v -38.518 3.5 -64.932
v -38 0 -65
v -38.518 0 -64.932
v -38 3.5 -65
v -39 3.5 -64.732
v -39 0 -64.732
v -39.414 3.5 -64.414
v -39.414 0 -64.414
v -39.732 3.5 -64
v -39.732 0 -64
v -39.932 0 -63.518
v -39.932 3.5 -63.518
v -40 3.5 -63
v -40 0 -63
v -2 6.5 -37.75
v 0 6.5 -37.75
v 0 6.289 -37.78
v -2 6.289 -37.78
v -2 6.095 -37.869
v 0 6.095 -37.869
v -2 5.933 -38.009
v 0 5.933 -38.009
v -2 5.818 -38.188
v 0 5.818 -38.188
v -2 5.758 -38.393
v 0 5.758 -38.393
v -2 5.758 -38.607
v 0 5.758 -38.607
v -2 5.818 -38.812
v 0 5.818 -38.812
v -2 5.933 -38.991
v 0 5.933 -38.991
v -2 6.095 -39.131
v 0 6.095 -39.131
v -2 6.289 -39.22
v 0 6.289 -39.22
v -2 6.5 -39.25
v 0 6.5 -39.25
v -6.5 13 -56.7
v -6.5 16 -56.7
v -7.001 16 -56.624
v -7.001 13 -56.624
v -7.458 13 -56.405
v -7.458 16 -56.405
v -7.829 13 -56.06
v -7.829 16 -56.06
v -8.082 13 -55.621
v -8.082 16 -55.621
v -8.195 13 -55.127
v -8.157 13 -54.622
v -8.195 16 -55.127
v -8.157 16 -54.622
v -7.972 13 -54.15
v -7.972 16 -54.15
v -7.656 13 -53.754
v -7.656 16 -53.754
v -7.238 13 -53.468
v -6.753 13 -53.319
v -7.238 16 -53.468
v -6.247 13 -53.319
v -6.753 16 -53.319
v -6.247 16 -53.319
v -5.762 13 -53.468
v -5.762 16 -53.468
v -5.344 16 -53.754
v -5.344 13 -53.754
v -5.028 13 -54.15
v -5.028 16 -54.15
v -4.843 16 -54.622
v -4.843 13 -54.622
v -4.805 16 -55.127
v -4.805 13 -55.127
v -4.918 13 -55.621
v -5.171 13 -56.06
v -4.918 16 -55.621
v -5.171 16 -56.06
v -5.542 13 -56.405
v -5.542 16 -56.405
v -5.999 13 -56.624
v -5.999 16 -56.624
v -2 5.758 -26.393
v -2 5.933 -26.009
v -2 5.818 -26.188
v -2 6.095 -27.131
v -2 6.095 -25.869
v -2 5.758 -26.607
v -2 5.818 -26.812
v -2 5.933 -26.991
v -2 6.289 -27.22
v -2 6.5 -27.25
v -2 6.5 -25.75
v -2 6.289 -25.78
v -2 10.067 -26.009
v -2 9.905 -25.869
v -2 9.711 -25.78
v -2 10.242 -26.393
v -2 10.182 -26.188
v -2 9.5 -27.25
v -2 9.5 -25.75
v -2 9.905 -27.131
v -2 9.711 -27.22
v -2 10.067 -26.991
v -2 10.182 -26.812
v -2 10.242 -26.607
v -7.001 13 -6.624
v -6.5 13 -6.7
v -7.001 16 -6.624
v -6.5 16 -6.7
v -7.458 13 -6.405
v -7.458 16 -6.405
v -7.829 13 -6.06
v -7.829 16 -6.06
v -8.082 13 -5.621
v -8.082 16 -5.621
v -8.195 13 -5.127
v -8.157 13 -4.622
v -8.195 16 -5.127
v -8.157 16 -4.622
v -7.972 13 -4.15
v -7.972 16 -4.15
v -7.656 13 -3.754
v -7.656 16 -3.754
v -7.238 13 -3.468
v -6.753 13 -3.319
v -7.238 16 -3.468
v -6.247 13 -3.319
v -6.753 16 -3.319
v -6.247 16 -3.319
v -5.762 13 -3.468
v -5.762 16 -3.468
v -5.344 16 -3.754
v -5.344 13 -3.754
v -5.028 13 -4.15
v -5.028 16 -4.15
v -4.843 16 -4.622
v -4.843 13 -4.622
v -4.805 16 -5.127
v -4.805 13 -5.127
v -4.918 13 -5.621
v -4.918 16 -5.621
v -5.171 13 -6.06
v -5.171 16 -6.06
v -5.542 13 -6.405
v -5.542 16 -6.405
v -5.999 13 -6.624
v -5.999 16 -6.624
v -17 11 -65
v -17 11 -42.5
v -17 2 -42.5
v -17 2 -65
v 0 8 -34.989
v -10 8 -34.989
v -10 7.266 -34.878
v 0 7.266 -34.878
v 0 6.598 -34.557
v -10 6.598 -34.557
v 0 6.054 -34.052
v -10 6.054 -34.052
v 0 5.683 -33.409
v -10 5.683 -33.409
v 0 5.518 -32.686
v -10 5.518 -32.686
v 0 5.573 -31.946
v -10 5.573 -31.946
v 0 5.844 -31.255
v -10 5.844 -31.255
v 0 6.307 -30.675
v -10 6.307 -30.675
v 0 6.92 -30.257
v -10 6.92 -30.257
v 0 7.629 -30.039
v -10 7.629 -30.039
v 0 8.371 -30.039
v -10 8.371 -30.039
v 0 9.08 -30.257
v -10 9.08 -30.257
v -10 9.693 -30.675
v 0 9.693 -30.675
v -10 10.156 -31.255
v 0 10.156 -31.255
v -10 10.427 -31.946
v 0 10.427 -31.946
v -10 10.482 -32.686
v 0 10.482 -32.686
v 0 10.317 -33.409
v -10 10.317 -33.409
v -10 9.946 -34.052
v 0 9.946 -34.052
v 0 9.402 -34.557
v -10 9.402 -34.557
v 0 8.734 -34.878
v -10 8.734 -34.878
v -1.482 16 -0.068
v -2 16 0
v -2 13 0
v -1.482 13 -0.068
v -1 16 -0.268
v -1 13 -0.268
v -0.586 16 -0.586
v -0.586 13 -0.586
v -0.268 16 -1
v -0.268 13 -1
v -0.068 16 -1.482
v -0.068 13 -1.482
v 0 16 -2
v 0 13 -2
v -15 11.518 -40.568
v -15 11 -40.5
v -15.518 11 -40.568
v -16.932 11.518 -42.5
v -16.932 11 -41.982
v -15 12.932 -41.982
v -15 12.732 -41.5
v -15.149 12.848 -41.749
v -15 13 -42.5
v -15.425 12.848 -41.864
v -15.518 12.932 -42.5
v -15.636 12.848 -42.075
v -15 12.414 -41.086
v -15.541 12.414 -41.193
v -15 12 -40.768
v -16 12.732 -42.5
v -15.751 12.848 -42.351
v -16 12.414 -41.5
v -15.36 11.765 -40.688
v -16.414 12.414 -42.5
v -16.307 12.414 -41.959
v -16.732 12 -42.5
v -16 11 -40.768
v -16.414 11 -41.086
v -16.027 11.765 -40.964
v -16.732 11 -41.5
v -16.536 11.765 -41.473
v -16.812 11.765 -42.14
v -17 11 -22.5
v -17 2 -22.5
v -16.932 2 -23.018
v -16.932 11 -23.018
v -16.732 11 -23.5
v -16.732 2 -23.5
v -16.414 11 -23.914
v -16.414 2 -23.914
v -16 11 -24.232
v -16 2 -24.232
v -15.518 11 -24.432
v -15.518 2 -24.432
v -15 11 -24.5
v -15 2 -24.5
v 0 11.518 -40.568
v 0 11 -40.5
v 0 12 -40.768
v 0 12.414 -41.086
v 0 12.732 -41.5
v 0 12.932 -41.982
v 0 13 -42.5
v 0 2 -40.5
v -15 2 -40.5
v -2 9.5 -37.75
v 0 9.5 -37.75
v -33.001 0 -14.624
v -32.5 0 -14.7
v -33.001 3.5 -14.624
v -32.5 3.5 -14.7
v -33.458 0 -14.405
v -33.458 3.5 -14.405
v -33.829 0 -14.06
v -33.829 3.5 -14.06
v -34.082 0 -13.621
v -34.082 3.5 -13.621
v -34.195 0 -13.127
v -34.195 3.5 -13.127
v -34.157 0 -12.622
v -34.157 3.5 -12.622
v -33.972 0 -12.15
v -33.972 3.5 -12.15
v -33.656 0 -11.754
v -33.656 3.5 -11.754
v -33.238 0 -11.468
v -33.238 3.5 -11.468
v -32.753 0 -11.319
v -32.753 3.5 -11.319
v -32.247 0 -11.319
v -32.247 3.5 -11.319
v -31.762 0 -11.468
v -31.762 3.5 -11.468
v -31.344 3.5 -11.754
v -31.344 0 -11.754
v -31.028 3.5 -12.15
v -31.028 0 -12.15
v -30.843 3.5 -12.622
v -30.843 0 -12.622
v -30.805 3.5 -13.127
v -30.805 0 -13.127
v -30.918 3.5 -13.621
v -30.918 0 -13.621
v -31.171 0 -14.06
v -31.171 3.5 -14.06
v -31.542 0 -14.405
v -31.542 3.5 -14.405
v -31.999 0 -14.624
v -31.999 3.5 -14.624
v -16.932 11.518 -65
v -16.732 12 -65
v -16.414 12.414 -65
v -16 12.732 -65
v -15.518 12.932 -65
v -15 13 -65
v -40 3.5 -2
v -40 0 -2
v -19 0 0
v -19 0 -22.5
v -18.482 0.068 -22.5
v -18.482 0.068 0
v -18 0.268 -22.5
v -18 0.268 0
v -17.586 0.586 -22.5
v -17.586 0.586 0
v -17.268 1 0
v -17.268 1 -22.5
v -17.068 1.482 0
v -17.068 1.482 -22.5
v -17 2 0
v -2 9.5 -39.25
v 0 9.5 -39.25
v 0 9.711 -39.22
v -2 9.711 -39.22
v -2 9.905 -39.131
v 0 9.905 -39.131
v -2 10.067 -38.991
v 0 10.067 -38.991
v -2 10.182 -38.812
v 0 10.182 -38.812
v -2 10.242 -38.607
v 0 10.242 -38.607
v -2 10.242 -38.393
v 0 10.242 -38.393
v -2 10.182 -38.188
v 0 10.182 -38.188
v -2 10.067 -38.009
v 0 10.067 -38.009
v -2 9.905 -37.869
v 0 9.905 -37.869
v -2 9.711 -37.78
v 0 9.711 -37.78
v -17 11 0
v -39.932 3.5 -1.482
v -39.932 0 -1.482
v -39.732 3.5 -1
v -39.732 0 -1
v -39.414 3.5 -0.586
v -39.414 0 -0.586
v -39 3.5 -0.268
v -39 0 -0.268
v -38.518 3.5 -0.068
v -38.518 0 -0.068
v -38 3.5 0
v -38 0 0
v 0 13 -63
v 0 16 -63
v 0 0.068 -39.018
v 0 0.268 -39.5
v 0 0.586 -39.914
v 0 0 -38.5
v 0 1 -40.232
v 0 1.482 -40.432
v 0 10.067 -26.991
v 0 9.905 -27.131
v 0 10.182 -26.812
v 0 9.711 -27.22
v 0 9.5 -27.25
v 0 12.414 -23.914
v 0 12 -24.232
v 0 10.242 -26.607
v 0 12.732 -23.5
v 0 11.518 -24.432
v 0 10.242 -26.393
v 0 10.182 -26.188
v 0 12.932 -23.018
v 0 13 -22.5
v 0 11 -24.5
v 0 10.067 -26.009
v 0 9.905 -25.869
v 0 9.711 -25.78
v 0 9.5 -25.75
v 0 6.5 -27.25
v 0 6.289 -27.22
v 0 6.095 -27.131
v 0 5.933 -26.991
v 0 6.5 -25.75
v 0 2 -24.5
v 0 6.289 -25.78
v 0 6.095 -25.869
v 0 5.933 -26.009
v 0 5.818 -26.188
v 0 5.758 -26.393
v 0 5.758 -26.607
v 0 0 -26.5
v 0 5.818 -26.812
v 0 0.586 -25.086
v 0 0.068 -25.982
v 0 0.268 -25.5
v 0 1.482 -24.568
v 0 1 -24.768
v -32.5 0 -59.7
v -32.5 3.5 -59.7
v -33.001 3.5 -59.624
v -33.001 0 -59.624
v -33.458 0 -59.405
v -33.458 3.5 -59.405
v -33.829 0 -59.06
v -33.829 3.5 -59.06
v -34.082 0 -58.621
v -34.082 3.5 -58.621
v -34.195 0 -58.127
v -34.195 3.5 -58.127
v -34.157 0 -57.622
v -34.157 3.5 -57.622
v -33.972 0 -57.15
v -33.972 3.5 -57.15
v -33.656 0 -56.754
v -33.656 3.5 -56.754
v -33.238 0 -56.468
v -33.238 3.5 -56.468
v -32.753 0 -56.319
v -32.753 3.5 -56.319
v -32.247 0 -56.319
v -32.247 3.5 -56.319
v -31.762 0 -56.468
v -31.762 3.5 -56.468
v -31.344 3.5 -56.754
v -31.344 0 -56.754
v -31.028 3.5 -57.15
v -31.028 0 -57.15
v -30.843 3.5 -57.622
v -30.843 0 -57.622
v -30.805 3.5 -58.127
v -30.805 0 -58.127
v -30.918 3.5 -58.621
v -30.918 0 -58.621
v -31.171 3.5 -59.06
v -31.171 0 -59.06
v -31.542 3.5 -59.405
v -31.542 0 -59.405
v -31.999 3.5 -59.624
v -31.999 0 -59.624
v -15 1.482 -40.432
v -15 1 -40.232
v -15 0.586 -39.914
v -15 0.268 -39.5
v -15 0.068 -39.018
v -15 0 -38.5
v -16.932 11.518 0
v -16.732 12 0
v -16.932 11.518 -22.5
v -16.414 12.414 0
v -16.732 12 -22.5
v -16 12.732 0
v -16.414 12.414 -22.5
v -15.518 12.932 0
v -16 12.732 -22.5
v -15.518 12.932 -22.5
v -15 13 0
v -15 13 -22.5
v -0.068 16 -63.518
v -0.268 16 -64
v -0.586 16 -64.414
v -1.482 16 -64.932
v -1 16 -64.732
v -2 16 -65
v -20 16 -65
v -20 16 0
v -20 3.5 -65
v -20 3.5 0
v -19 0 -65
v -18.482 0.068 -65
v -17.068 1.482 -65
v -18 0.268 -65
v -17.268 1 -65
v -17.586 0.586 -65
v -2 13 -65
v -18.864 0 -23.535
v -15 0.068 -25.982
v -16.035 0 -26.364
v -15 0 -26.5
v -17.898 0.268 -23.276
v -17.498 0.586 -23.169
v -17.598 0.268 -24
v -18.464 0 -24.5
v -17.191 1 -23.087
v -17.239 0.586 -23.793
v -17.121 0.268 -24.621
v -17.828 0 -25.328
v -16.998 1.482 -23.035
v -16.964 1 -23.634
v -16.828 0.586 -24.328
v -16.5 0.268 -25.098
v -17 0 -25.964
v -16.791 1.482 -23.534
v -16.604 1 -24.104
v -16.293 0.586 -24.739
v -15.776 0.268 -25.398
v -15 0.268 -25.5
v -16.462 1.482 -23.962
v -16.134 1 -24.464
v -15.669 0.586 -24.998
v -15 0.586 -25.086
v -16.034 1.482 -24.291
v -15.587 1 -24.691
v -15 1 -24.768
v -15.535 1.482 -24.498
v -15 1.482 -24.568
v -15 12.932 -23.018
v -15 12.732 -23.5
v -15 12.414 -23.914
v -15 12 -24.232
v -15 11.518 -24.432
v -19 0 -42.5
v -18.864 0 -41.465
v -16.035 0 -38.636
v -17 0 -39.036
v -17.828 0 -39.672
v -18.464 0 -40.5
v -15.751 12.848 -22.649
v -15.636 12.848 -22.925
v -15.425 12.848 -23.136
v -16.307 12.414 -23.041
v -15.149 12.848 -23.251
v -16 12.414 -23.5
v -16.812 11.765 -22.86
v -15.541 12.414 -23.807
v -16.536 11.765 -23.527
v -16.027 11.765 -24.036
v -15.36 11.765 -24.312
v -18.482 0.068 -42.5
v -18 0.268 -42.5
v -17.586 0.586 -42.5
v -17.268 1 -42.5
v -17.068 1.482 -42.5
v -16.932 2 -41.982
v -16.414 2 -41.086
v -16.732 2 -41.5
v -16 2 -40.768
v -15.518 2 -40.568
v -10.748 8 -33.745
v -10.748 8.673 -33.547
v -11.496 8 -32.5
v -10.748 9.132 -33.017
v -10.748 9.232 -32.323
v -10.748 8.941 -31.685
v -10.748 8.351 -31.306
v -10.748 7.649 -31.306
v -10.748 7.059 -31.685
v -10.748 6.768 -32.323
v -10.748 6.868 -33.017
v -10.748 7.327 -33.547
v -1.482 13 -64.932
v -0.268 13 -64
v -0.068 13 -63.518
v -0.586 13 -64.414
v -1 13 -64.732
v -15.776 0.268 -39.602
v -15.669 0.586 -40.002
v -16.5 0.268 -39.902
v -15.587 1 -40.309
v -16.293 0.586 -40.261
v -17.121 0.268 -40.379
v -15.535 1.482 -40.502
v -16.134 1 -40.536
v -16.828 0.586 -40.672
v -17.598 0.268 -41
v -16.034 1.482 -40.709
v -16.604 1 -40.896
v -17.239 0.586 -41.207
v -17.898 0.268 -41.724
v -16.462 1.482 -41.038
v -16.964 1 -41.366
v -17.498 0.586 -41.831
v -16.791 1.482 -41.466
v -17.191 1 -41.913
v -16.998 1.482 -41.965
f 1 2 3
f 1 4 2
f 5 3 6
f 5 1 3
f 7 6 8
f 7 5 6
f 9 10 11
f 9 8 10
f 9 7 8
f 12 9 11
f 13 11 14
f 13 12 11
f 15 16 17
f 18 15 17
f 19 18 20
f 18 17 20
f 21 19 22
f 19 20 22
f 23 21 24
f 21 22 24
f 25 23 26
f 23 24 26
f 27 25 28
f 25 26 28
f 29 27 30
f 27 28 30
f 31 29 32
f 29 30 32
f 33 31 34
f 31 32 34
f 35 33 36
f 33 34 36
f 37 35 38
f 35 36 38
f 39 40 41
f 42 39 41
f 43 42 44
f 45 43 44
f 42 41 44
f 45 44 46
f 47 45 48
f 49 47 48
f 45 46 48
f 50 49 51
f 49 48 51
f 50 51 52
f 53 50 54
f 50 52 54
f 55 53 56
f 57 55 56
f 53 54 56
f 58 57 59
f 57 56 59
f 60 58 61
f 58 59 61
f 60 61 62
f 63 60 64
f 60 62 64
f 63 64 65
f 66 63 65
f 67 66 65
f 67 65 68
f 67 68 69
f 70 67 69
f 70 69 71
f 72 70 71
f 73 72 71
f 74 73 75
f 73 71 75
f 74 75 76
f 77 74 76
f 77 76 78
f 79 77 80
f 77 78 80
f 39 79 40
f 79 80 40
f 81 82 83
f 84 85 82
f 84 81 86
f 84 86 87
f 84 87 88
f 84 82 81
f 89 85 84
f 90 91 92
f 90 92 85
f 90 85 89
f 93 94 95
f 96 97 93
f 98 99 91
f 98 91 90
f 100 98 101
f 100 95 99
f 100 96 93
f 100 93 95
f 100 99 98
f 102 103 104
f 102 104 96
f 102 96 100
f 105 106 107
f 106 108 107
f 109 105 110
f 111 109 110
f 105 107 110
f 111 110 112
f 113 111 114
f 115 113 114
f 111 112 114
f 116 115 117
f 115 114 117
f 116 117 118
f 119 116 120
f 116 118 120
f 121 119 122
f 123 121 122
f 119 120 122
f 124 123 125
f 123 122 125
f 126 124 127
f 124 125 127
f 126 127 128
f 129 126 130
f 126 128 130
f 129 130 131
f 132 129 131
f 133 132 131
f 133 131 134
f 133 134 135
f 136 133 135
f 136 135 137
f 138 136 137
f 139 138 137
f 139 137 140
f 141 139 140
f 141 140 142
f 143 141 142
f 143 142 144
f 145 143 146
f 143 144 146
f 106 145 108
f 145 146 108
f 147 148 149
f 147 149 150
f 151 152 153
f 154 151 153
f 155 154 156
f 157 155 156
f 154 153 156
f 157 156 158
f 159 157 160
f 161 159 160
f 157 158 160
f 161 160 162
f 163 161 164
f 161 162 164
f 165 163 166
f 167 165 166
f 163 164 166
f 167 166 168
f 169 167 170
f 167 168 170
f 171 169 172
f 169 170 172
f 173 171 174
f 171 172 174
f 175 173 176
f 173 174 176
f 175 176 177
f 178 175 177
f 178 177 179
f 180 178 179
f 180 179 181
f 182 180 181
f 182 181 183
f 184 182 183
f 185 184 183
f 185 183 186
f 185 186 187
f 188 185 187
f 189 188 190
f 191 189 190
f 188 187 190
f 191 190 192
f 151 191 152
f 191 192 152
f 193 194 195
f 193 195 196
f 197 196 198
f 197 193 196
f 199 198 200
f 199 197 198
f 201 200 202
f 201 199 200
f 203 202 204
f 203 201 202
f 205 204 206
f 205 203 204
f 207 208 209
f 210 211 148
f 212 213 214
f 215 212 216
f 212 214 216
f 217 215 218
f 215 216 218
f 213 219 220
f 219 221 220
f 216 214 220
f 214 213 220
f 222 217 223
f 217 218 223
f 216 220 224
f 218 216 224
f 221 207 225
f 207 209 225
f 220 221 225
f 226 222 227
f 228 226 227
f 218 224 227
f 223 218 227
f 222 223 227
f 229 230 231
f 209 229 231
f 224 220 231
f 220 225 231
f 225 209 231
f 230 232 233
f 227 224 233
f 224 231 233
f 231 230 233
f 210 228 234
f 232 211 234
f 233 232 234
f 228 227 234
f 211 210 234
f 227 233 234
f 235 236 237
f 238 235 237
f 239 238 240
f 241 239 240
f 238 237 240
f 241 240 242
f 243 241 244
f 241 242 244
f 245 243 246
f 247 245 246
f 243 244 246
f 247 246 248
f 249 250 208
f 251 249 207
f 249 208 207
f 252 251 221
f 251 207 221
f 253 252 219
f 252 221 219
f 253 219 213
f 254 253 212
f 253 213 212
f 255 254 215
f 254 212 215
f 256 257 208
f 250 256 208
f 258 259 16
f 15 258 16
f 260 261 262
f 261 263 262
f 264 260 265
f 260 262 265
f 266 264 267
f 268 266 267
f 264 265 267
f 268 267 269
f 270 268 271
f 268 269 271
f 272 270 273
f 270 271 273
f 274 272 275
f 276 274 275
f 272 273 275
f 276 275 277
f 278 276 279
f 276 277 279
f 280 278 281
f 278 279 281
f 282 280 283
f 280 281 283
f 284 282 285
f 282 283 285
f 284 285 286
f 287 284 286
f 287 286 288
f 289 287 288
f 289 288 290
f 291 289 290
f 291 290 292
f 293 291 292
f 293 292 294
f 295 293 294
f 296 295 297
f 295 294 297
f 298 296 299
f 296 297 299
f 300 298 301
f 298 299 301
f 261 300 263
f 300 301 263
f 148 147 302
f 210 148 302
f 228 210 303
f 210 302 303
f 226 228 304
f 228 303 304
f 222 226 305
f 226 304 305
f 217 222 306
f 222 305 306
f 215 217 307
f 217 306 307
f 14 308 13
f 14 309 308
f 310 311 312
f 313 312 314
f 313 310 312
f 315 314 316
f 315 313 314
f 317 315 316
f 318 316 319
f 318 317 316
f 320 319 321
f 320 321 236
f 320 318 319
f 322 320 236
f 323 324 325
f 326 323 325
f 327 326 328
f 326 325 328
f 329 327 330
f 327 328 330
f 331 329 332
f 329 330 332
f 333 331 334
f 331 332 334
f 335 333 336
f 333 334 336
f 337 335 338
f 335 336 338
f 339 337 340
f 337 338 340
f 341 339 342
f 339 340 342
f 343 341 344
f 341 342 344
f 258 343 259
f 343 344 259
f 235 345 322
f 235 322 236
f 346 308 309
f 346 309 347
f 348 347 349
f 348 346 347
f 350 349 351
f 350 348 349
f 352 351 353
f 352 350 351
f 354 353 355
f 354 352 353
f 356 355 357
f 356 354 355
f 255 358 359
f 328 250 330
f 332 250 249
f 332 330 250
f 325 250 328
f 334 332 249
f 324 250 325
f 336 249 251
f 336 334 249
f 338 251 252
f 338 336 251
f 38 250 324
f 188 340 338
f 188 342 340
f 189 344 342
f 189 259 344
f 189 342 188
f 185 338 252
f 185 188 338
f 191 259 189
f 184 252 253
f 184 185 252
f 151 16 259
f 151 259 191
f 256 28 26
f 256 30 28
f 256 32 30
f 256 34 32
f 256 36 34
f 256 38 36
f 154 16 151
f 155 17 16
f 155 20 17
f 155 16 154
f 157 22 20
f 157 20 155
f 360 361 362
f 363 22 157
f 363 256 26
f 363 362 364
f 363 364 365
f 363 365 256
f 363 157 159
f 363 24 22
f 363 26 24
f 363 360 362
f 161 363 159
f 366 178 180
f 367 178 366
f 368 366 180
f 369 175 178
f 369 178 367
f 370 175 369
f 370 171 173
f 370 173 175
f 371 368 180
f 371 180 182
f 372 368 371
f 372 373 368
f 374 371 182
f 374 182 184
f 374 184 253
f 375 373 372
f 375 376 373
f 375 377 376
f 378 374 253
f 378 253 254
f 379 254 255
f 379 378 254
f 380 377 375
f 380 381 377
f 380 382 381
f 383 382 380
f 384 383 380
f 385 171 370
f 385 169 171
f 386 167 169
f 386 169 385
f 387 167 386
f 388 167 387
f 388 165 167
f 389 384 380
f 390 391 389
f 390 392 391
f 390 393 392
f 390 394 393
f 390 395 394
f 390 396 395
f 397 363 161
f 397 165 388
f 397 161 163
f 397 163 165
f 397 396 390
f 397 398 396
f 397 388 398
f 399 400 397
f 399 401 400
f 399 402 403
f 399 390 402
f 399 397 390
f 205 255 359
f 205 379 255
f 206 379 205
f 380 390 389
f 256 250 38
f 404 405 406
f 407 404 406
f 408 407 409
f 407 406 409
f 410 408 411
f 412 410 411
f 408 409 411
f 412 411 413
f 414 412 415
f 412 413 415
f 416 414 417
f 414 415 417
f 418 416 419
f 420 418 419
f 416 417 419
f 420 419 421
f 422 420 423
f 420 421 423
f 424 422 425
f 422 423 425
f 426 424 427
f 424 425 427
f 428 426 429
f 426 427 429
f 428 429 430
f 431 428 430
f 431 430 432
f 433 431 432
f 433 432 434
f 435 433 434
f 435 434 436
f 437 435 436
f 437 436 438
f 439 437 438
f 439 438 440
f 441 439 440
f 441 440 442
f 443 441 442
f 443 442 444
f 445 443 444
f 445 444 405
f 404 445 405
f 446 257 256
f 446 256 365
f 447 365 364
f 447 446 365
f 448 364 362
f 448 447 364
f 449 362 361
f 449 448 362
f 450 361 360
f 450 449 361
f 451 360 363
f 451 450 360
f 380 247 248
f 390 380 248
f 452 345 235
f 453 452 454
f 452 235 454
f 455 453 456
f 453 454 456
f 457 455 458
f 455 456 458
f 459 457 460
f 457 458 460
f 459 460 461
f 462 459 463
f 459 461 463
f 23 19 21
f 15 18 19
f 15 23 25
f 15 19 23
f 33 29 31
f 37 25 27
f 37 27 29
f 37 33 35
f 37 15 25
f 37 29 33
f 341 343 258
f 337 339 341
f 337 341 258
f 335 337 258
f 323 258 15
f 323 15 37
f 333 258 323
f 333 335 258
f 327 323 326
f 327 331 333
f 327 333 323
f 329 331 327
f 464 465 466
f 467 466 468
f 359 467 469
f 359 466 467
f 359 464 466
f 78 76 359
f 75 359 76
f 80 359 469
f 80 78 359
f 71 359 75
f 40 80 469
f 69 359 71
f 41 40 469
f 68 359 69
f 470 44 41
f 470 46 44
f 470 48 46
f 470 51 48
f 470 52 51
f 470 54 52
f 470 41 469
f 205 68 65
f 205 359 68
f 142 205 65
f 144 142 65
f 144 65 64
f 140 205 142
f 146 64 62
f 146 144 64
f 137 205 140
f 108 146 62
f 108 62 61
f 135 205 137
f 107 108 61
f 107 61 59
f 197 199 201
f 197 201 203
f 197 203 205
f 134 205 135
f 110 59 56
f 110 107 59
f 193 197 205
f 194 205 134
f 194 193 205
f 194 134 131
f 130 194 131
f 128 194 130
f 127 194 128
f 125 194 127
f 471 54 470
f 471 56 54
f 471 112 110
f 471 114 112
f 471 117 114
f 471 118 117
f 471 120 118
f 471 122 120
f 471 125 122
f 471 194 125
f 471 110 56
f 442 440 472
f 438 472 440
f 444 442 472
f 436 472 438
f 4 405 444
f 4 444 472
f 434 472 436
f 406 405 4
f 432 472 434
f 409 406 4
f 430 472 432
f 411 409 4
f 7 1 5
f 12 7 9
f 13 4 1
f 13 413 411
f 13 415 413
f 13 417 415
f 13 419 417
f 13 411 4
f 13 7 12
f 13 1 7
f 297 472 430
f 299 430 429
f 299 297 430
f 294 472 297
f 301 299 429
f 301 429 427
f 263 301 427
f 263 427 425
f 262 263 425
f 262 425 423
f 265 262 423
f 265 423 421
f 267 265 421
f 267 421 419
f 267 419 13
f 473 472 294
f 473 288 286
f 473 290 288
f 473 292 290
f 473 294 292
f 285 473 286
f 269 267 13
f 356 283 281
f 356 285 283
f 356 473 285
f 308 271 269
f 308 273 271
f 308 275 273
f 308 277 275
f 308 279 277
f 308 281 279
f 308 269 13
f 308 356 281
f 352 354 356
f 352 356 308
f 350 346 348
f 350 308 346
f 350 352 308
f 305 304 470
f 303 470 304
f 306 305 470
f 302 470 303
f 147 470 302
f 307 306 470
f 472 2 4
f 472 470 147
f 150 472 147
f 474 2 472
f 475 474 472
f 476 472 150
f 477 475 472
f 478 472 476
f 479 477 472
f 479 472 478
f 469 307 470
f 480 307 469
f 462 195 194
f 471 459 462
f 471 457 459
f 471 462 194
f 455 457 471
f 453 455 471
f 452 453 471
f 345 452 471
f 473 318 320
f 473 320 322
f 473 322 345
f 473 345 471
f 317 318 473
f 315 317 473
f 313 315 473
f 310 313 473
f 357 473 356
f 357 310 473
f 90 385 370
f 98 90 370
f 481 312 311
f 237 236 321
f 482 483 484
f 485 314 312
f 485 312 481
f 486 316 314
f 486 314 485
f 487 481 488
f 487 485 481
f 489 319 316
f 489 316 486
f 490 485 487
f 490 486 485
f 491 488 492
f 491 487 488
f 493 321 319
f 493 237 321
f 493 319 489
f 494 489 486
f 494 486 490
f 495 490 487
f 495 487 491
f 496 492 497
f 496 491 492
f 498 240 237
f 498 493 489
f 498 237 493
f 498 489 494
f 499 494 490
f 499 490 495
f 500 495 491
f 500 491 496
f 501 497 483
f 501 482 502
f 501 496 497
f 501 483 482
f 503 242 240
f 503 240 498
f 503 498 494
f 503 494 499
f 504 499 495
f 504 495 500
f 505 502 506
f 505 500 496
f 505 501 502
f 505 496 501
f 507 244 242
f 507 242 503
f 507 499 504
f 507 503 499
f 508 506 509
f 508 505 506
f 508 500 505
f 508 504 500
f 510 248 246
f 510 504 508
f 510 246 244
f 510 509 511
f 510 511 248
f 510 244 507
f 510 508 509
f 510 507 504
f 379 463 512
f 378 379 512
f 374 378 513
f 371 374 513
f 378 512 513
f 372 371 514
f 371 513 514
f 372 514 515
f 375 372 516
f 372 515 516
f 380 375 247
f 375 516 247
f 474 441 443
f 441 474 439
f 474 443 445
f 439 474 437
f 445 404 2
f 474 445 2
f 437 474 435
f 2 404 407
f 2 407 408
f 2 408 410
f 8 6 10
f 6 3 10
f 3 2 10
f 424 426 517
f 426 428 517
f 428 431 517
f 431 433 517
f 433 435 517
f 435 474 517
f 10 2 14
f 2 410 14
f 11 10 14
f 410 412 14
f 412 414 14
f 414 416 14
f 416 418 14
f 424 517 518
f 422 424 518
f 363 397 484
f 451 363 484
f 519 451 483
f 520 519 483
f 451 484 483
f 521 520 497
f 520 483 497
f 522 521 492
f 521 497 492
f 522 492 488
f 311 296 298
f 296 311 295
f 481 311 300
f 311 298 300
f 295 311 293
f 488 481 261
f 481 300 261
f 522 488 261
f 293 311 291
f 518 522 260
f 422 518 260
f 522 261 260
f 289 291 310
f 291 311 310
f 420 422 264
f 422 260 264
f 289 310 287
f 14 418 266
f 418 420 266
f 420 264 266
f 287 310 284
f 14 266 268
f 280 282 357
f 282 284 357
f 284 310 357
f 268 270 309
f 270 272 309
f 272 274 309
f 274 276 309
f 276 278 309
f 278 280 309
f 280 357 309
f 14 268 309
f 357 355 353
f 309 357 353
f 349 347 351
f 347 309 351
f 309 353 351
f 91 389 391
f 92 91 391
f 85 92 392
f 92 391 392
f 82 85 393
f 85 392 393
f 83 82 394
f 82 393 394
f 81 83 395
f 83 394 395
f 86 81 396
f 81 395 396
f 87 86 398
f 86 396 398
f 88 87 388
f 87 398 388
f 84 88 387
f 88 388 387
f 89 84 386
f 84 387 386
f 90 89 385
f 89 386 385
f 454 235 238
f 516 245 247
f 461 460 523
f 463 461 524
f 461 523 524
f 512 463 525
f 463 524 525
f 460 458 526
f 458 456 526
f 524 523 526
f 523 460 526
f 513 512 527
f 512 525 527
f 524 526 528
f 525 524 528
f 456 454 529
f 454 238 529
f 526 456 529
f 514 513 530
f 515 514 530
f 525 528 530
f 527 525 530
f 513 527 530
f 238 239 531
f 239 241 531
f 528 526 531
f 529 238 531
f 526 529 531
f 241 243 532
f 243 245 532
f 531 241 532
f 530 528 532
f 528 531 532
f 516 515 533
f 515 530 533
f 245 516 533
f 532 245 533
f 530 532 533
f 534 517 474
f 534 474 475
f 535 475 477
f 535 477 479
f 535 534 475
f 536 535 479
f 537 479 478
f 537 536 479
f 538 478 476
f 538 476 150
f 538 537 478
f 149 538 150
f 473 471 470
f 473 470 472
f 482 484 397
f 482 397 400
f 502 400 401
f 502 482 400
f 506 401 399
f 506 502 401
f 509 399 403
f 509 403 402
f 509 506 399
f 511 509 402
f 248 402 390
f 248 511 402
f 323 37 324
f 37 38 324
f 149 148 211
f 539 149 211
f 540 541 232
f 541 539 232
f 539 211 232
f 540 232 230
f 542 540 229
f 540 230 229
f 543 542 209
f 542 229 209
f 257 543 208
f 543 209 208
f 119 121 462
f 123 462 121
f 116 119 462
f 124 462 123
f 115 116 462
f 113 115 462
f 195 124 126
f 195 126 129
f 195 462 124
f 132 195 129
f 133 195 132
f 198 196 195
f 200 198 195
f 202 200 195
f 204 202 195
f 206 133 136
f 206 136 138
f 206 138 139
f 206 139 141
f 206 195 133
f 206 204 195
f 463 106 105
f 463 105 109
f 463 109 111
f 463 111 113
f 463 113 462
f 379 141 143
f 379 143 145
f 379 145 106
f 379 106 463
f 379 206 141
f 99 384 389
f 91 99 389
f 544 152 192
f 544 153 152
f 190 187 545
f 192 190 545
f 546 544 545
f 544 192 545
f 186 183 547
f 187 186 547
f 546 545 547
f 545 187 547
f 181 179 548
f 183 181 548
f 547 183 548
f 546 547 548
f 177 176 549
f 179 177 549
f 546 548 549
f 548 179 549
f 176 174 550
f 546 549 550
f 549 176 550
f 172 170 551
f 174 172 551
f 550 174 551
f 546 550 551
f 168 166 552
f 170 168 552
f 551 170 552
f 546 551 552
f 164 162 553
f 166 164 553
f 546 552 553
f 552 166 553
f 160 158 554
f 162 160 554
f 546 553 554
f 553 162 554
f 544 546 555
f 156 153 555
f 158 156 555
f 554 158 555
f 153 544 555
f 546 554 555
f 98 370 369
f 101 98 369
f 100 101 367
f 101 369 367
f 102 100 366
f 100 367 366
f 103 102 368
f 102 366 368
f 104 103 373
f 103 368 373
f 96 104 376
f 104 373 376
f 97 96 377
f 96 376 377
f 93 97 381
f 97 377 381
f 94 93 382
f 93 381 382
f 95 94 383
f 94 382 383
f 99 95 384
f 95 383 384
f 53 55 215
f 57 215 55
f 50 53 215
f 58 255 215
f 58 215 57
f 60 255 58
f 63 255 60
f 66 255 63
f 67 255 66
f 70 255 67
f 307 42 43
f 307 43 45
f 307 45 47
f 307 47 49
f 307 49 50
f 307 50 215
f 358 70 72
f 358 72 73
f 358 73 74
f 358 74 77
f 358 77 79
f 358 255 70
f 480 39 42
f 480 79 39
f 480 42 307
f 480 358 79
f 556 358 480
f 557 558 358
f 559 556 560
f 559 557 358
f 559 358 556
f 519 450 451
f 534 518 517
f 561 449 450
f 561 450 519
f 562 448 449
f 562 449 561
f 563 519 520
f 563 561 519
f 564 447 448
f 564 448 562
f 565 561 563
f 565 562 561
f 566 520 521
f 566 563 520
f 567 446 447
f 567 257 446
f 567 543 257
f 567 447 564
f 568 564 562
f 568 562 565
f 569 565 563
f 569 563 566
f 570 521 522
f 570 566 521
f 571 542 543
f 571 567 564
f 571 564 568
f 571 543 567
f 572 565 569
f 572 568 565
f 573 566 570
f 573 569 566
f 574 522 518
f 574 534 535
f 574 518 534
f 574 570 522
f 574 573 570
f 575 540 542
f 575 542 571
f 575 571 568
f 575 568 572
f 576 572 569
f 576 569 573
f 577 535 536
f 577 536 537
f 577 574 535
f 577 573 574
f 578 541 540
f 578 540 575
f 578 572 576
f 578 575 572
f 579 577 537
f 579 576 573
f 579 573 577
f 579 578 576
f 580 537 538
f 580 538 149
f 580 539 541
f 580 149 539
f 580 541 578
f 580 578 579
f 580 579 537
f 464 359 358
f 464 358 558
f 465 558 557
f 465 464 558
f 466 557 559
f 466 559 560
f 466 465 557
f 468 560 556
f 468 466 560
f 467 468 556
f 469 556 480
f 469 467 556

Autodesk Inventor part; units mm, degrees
ref_plane "YZ Plane" through (0, 0, 0) normal (1, 0, 0) x (0, 1, 0)
ref_plane "XZ Plane" through (0, 0, 0) normal (0, 1, 0) x (-1, 0, 0)
ref_plane "XY Plane" through (0, 0, 0) normal (0, 0, 1) x (1, 0, 0)
sketch "Sketch1" plane through (0, 0, 0) normal (0, 1, 0) x (-1, 0, 0)
  line L0 (0, 0) -> (40, 0)
  line L1 (40, 0) -> (40, -65)
  line L2 (40, -65) -> (0, -65)
  line L3 (0, -65) -> (0, 0)
  dimension "d0" = 40
  dimension "d1" = 65
extrude "Extrusion1" add sketch "Sketch1" along normal blind 16
sketch "Sketch2" plane through (-40, 0, 0) normal (0, 0, 1) x (1, 0, 0)
  line L0 (0, 16) -> (40, 16) projected
  line L1 (0, 16) -> (20, 16)
  line L2 (20, 16) -> (20, 3.5)
  line L3 (20, 3.5) -> (0, 3.5)
  line L4 (0, 3.5) -> (0, 16)
  line L5 (40, 0) -> (0, 0) projected
  dimension "d4" = 20
  dimension "d5" = 3.5
extrude "Extrusion2" cut sketch "Sketch2" against normal through all
sketch "Sketch3" plane through (0, 0, 0) normal (0, -1, 0) x (1, 0, 0)
  line L0 (-32.5, -58) -> (-32.5, -13) construction
  line L1 (-6.5, -55) -> (-6.5, -5) construction
  line L2 (-40, -65) -> (0, -65) construction
  line L3 (0, 0) -> (-40, 0) construction
  line L4 (0, -65) -> (0, 0) construction
  line L5 (-40, 0) -> (-40, -65) construction
  dimension "d8" = 45
  dimension "d9" = 50
  dimension "d10" = 7
  dimension "d11" = 5
  dimension "d12" = 6.5
  dimension "d13" = 7.5
hole "Hole1" at (-32.5, 0, -58) at (-32.5, 0, -13) at (-6.5, 0, -55) at (-6.5, 0, -5) direction (0, 1, 0) diameter 3.4 end through all clearance for "Flat Head Machine Screw" size "M3" standard "Ansi Metric M Profile"
sketch "Sketch4" plane through (0, 0, 0) normal (1, 0, 0) x (0, 0, -1)
  line L0 (38.5, 6.5) -> (38.5, 9.5) construction
  line L1 (39.25, 6.5) -> (39.25, 9.5)
  line L2 (37.75, 9.5) -> (37.75, 6.5)
  arc A0 (37.75, 6.5) -> (39.25, 6.5) centre (38.5, 6.5) ccw
  arc A1 (39.25, 9.5) -> (37.75, 9.5) centre (38.5, 9.5) ccw
  line L3 (26.5, 6.5) -> (26.5, 9.5) construction
  line L4 (27.25, 6.5) -> (27.25, 9.5)
  line L5 (25.75, 9.5) -> (25.75, 6.5)
  arc A2 (25.75, 6.5) -> (27.25, 6.5) centre (26.5, 6.5) ccw
  arc A3 (27.25, 9.5) -> (25.75, 9.5) centre (26.5, 9.5) ccw
  line L6 (0, 0) -> (0, 16) construction
  line L7 (65, 0) -> (65, 16) construction
  line L8 (38.5, 8) -> (26.5, 8) construction
  line L9 (65, 0) -> (0, 0) construction
  line L10 (0, 16) -> (65, 16) construction
  line L11 (65, 0) -> (40.5, 0)
  line L12 (40.5, 0) -> (40.5, 13)
  line L13 (40.5, 13) -> (65, 13)
  line L14 (65, 13) -> (65, 0)
  line L15 (24.5, 0) -> (0, 0)
  line L16 (0, 0) -> (0, 13)
  line L17 (0, 13) -> (24.5, 13)
  line L18 (24.5, 13) -> (24.5, 0)
  point P0 (32.5, 8)
  dimension "d21" = 12
  dimension "d22" = 6
  dimension "d23" = 65
  dimension "d24" = 32.5
  dimension "d25" = 3
  dimension "d26" = 3
  dimension "d27" = 0.75
  dimension "d28" = 0.75
  dimension "d29" = 0
  dimension "d30" = 16
  dimension "d31" = 8
  dimension "d32" = 3
  dimension "d33" = 3
  dimension "d34" = 16
  dimension "d35" = 8
extrude "Extrusion3" cut sketch "Sketch4" against normal blind 2 contours A0 L2 A1 L1 | A2 L5 A3 L4
extrude "Extrusion4" cut sketch "Sketch4" against normal blind 17 contours L11 L12 L13 L14 | L15 L16 L17 L18
fillet "Fillet1" radius 2 14 edges at (-8.5, 0, -40.5) (-8.5, 0, -24.5) (-40, 1.75, -65) (-40, 1.75, 0) (0, 14.5, 0) (0, 14.5, -65) (-17, 0, -52.75) (-17, 0, -12.25) (-17, 6.5, -40.5) (-17, 6.5, -24.5) (-17, 13, -52.75) (-8.5, 13, -40.5) (-17, 13, -12.25) (-8.5, 13, -24.5)
hole "Hole2" at (0, 8, -32.5) direction (-1, 0, 0) diameter 4.978 depth 10 tip angle 118 thread size "1/4-20 UNC" class "2B" standard "ANSI Unified Screw Threads"
equation "\"d22\" = 0.5 * d21"
equation "\"d24\" = 0.5 * d23"
equation "\"d26\" = d25"
equation "\"d28\" = d27"
equation "\"d31\" = 0.5 * d30"
equation "\"d35\" = 0.5 * d34"
properties part number "Dual Camera Mount"
